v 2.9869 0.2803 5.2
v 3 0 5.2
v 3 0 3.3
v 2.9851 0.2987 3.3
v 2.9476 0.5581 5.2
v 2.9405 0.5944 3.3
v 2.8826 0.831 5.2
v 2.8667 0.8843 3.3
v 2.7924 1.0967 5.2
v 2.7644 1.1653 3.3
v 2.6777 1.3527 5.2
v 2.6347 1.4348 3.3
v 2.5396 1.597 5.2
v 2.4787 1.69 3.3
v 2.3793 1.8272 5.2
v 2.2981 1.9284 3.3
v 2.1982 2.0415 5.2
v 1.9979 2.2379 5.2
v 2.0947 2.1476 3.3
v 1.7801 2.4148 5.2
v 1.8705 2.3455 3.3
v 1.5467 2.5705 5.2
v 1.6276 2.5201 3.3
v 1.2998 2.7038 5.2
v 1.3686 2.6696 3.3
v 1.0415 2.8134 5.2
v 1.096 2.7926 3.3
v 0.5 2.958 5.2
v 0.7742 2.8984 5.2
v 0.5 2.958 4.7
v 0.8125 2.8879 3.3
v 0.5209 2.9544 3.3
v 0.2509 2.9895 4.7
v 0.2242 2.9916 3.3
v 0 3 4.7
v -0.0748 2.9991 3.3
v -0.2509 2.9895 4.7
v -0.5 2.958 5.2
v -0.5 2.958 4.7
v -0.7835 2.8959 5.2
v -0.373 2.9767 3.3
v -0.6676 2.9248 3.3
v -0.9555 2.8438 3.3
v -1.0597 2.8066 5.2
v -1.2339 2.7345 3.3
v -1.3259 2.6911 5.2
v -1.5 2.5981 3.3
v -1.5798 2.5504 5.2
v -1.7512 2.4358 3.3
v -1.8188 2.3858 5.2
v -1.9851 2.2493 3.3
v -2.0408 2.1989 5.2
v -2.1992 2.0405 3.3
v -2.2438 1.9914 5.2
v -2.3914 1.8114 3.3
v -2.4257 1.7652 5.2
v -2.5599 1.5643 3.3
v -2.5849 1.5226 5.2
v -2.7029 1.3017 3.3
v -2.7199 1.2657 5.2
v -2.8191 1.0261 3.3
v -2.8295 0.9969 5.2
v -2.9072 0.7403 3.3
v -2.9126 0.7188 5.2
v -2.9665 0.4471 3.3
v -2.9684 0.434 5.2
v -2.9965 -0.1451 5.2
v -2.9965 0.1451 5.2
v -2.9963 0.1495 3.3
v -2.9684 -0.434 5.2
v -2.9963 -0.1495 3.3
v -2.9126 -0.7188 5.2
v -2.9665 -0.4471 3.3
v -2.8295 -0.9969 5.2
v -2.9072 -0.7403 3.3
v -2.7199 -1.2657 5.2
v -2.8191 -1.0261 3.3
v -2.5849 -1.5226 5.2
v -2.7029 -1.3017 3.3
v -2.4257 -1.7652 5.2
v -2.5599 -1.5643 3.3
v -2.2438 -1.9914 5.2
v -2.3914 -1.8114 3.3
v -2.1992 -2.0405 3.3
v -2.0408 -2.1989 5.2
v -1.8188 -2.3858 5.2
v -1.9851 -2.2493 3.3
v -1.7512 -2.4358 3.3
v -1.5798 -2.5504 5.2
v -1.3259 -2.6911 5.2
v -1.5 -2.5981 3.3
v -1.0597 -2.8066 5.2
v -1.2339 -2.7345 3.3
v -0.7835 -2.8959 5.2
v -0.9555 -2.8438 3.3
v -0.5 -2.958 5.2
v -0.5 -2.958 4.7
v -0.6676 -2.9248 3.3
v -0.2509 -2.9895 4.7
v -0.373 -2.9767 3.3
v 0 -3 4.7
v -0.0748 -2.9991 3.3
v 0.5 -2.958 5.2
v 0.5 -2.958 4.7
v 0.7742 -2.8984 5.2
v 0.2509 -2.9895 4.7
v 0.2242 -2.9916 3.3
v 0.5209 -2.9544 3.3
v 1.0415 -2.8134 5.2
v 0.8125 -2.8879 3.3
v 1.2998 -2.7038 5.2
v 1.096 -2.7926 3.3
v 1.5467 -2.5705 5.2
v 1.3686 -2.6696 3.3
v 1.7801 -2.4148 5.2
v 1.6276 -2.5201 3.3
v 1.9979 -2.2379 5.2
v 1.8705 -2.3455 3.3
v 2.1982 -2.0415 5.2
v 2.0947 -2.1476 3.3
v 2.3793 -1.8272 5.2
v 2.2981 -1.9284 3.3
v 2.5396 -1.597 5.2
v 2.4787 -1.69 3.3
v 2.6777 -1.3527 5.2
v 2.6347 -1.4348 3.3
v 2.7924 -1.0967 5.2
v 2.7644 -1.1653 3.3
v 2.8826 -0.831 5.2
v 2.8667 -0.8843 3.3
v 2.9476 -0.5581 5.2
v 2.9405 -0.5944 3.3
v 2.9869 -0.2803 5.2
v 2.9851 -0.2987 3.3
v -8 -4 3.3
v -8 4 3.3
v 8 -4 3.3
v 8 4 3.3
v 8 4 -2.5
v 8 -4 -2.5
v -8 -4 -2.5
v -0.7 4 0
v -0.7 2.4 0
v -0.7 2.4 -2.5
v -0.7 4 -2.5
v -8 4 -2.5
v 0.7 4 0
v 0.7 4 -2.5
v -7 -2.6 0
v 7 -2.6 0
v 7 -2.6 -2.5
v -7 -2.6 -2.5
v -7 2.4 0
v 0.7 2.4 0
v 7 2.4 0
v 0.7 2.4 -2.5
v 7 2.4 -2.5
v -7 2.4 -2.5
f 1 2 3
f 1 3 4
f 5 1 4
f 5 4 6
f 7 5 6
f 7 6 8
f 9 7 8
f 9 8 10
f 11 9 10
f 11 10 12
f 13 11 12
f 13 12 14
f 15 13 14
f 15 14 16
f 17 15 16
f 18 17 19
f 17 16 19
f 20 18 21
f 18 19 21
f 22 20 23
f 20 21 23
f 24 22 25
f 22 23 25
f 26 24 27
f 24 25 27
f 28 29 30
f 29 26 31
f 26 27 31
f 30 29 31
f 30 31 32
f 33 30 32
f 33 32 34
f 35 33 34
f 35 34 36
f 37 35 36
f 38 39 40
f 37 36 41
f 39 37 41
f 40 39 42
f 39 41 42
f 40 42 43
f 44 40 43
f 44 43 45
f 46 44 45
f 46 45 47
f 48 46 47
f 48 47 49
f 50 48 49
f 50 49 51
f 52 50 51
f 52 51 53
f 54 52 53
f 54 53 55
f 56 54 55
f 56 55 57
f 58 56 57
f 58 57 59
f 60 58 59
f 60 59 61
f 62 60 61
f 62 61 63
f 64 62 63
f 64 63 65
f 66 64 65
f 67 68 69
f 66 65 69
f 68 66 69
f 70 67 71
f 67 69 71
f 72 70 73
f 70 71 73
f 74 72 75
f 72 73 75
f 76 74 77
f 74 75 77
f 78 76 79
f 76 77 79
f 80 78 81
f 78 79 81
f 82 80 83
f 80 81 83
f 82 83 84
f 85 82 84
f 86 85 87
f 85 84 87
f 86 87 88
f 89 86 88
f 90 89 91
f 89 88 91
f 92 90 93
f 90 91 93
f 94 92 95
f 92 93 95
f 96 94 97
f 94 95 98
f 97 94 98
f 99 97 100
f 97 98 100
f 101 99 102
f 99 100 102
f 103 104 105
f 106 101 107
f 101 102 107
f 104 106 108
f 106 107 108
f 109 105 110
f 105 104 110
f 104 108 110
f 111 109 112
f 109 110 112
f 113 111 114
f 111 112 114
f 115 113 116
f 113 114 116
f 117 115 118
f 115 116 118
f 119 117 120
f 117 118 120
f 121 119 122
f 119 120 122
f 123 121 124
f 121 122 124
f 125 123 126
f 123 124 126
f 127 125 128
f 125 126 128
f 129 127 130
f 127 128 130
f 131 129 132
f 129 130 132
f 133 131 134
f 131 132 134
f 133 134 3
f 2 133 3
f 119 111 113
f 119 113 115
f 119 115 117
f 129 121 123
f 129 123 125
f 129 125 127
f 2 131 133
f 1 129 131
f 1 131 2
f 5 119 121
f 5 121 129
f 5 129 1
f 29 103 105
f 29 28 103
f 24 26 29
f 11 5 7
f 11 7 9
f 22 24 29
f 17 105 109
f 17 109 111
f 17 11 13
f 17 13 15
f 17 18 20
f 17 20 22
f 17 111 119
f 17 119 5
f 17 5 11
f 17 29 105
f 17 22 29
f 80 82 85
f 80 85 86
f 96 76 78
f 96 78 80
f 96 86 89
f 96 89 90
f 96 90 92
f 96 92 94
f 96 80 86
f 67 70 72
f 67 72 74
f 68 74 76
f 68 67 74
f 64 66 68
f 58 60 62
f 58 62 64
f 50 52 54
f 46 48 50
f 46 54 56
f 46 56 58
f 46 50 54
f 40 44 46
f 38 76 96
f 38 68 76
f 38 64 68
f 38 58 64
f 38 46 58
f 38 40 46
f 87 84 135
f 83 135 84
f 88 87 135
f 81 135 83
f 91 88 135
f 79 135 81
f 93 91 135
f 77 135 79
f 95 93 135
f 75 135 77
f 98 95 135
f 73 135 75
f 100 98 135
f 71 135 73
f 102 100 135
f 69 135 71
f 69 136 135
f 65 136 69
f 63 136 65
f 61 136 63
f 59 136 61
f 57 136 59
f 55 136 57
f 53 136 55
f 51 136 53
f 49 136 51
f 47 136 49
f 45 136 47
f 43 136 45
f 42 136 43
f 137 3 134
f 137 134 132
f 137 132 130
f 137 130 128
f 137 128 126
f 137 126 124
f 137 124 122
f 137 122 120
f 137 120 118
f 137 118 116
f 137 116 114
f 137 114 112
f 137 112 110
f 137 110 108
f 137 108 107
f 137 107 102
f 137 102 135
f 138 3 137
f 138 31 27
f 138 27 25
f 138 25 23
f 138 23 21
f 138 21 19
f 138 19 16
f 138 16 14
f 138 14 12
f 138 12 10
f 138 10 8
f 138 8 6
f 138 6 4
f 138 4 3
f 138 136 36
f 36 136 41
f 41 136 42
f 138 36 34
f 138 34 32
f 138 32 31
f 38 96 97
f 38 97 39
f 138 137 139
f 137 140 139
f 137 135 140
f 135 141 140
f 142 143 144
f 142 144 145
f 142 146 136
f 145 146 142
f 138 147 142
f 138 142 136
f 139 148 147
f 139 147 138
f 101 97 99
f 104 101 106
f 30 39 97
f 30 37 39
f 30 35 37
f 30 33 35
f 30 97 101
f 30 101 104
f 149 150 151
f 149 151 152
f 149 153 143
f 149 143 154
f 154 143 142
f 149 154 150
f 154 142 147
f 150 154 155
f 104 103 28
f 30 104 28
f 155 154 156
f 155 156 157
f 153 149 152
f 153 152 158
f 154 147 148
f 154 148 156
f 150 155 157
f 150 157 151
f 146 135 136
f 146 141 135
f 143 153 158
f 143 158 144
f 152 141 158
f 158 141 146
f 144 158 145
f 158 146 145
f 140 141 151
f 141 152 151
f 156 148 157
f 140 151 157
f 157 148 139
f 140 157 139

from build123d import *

# Parameters (mm, degrees)
PAD_DEPTH    = 2.5
SKETCH001_W  = 16
SKETCH001_H  = 8
PAD001_DEPTH = 3.3
SKETCH002_R  = 3
PAD002_DEPTH = 5.2
SKETCH003_W  = 1
SKETCH003_H  = 8
POCKET_DEPTH = 0.5


with BuildPart() as part:
    # Sketch → Pad (new body)
    with BuildSketch(Plane.XY):
        Polygon((-8, 4), (-8, -4), (8, -4), (8, 4), (0.7, 4), (0.7, 2.4), (7, 2.4), (7, -2.6), (-7, -2.6), (-7, 2.4), (-0.7, 2.4), (-0.7, 4), align=None)
    extrude(amount=-PAD_DEPTH)

    # Sketch001 → Pad001 (join)
    with BuildSketch(Plane.XY):
        Rectangle(SKETCH001_W, SKETCH001_H)
    extrude(amount=PAD001_DEPTH)

    # Sketch002 → Pad002 (join)
    with BuildSketch(Plane.XY):
        Circle(SKETCH002_R)
    extrude(amount=PAD002_DEPTH)

    # Sketch003 (on Face10 of Pad002) → Pocket (cut)
    with BuildSketch(Plane.XY.offset(5.2)):
        Rectangle(SKETCH003_W, SKETCH003_H)
    extrude(amount=-POCKET_DEPTH, mode=Mode.SUBTRACT)


solid = part.part
